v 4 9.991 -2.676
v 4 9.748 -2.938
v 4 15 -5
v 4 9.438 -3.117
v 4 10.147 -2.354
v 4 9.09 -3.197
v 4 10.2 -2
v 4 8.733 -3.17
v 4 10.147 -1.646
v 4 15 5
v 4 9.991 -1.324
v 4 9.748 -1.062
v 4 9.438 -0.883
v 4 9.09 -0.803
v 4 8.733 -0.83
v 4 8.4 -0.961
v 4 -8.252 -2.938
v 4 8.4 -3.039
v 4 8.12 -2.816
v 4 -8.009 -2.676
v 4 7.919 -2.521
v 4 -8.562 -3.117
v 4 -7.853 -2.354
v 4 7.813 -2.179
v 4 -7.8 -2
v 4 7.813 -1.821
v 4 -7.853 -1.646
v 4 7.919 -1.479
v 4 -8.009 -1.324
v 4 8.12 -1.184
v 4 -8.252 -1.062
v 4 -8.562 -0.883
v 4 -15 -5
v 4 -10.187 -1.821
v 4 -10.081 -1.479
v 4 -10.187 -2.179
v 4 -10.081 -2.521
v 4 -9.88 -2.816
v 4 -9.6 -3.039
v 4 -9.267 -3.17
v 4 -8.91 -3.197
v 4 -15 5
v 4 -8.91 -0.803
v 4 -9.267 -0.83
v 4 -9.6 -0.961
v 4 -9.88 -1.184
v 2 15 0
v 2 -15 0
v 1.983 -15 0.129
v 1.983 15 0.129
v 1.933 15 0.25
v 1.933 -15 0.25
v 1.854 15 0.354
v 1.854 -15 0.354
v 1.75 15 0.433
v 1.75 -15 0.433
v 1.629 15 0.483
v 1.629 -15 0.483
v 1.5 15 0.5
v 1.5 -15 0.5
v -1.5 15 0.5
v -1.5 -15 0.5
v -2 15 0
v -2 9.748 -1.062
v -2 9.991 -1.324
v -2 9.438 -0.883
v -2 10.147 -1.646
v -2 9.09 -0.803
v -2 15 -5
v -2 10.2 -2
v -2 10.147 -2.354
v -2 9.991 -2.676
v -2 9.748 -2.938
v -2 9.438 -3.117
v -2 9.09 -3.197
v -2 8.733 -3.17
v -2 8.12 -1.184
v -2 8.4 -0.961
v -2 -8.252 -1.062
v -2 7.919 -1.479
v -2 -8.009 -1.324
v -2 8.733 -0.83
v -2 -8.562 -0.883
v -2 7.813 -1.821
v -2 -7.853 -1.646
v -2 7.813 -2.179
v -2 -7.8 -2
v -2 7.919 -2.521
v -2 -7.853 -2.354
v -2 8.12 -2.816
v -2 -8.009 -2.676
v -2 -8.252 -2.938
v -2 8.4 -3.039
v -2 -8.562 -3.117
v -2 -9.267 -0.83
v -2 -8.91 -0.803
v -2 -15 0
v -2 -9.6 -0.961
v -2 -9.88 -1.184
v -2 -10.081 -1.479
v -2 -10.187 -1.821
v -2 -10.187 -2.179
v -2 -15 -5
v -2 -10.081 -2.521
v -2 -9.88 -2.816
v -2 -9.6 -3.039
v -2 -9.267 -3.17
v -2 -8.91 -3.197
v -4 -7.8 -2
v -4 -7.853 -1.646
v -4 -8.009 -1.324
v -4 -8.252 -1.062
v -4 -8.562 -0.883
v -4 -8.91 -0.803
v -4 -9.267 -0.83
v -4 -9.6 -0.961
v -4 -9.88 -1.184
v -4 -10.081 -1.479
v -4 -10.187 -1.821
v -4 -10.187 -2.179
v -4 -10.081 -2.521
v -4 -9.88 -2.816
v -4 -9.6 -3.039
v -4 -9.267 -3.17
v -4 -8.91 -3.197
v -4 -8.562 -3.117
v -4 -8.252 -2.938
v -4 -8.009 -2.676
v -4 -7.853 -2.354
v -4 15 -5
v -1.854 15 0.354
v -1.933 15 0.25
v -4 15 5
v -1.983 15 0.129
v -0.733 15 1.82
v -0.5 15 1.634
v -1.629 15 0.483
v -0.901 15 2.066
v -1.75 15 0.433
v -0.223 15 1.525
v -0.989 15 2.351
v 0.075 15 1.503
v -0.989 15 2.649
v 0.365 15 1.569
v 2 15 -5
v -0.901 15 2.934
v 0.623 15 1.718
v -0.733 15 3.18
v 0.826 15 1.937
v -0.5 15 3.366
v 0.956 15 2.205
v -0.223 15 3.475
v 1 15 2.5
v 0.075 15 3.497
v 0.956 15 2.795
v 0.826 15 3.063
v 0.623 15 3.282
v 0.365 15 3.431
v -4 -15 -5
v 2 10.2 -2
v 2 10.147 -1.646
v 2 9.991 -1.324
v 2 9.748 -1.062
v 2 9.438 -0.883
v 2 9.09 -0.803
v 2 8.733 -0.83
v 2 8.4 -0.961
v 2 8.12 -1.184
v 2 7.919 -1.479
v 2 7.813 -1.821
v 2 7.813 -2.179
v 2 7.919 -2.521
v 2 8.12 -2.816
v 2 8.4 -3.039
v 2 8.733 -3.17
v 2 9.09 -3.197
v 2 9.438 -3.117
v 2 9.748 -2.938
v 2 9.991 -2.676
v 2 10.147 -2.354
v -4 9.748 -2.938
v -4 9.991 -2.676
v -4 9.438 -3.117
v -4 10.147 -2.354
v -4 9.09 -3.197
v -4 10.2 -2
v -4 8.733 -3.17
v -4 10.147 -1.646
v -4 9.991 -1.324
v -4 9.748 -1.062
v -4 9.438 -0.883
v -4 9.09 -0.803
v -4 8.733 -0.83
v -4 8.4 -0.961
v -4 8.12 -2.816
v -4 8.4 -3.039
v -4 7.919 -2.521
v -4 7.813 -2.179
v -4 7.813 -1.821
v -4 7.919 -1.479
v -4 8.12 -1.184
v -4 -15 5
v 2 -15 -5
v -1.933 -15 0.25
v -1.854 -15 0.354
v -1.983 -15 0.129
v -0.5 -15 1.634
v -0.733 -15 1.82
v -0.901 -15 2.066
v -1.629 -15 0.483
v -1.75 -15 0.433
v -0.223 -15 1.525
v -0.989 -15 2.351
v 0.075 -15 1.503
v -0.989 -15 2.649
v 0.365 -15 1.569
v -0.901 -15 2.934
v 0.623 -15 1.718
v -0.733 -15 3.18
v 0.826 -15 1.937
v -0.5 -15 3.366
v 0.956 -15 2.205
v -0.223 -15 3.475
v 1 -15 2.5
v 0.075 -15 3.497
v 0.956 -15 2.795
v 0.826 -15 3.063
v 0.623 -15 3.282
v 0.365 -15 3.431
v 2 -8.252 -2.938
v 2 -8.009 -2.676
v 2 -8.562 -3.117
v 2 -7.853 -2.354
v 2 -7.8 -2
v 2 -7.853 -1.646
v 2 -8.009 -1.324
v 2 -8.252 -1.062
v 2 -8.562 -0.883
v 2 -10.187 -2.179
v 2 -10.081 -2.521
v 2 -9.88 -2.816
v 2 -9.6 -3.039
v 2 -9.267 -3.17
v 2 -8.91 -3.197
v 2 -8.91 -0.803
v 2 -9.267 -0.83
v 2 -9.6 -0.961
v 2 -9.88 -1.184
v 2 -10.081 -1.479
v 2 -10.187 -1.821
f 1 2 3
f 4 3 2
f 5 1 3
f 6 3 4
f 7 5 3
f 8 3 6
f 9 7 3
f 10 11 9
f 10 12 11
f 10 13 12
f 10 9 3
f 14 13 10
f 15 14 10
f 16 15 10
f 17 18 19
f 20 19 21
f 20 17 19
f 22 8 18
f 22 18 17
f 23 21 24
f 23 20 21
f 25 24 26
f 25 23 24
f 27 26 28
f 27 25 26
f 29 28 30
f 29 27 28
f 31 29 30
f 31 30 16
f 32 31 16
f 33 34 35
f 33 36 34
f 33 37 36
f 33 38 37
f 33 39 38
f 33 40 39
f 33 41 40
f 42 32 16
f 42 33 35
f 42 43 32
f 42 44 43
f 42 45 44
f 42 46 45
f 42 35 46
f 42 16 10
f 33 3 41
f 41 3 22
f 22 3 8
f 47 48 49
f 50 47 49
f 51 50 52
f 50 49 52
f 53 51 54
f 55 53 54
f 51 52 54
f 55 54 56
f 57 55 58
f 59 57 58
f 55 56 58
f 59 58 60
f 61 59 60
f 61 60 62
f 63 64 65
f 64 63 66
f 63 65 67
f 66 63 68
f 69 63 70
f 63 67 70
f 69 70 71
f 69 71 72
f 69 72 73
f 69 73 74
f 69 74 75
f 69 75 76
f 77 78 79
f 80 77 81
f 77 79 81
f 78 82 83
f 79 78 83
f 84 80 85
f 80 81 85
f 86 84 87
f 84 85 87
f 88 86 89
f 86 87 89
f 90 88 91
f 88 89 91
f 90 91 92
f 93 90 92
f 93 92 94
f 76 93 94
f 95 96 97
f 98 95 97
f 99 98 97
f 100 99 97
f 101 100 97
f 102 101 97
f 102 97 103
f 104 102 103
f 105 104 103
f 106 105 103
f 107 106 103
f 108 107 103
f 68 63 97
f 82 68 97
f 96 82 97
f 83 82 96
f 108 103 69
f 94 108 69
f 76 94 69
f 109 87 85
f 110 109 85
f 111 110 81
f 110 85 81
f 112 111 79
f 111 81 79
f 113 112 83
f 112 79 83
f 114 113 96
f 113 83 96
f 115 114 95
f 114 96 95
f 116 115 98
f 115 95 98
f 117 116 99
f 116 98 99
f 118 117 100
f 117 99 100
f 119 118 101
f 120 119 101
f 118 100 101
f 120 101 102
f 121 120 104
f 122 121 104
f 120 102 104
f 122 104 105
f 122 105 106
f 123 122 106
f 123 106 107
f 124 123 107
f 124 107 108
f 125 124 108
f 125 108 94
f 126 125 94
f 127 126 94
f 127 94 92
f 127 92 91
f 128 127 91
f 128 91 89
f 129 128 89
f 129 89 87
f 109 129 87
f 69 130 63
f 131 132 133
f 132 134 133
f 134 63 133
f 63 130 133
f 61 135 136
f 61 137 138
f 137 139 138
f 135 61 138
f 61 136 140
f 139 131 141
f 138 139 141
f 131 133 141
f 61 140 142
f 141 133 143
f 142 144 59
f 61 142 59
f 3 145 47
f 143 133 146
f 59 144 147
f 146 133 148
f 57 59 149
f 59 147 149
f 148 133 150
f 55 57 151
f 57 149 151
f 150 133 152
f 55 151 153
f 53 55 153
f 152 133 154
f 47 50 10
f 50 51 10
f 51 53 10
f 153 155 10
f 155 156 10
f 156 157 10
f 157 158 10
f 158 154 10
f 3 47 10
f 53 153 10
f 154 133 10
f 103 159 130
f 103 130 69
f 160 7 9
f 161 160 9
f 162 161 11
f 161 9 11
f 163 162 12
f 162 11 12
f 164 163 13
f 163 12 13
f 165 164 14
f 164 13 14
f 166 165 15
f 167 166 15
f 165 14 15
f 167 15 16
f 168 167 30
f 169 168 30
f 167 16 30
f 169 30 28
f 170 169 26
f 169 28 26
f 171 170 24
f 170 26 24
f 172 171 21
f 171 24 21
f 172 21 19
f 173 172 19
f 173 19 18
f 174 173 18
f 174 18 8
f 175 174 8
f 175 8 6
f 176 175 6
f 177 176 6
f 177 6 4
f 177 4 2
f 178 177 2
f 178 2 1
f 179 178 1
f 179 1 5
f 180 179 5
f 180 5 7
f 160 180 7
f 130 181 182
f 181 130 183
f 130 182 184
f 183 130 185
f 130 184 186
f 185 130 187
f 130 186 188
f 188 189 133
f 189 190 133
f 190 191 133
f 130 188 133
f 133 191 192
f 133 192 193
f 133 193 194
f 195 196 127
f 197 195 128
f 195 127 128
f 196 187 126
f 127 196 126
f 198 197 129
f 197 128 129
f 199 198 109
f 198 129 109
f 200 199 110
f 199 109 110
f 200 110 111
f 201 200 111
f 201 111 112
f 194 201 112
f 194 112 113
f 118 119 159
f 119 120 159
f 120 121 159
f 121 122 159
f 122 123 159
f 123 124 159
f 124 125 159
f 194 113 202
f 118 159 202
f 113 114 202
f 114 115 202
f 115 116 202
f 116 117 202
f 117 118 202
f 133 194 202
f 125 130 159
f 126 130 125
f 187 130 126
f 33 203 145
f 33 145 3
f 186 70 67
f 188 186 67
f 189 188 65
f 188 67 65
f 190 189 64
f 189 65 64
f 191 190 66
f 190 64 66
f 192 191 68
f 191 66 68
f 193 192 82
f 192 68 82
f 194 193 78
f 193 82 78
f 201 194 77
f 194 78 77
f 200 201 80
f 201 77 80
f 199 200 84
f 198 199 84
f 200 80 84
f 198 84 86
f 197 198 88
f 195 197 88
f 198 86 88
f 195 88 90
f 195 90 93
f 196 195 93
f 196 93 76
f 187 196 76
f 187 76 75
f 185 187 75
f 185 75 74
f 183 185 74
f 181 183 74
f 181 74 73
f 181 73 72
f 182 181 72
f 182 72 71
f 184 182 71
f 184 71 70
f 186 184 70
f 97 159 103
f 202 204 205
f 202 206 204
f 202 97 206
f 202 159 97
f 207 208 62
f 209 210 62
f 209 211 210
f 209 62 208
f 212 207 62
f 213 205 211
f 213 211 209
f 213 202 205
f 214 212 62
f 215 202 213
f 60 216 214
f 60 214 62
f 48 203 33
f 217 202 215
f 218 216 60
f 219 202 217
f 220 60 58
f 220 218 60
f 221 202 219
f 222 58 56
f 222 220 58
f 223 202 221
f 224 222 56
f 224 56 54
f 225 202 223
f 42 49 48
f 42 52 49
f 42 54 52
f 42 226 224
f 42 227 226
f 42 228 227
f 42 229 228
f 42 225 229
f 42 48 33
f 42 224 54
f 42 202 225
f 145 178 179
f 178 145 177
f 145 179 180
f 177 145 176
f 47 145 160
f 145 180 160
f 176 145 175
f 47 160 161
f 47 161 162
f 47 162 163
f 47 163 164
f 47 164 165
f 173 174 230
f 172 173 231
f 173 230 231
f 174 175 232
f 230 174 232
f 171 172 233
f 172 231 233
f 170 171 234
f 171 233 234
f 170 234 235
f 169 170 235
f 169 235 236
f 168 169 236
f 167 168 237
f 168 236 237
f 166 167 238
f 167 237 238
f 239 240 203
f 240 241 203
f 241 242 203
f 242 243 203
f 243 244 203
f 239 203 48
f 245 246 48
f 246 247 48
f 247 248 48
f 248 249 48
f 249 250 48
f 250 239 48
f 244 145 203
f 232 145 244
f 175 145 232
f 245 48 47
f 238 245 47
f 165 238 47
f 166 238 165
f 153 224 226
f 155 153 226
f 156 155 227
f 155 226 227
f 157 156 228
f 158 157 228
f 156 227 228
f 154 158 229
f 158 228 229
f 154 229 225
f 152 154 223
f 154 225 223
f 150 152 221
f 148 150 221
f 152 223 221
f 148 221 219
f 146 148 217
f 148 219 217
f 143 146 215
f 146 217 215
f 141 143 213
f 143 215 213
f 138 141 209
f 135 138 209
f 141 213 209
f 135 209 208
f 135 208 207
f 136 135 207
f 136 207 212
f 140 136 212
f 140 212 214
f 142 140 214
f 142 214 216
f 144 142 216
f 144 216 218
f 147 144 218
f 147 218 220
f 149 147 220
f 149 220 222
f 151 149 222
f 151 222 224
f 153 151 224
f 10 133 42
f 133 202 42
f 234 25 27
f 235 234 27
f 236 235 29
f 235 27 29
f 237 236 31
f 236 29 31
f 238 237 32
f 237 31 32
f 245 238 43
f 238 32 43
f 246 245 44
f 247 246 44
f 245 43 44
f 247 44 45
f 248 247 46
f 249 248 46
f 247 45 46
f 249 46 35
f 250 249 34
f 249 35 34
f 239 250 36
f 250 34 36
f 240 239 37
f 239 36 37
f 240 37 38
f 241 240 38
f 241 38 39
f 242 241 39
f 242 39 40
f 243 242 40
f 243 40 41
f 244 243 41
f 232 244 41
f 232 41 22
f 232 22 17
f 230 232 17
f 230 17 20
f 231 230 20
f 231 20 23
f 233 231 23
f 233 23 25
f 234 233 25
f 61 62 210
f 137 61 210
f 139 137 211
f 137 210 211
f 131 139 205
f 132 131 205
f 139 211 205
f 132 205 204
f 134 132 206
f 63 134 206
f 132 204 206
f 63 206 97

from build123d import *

# Parameters (mm, degrees)
F0_W          = 8
F0_H          = 10
F1_DEPTH      = 15
F1_DEPTH_BACK = 15
F2_R          = 1
F3_DEPTH      = 30.001
F5_DEPTH      = 30.001
F6_R          = 1.2
F7_DEPTH      = 8.001


with BuildPart() as f1:
    # F0 (on Front) → F1 (new body, two sides)
    with BuildSketch(Plane.XZ) as f1_sk:
        Rectangle(F0_W, F0_H)
    extrude(amount=F1_DEPTH)
    extrude(f1_sk.sketch, amount=-F1_DEPTH_BACK)

    # F2 (on face) → F3 (cut, through all)
    with BuildSketch(Plane.XZ.offset(15)):
        with Locations((0, 2.5)):
            Circle(F2_R)
    extrude(amount=-F3_DEPTH, mode=Mode.SUBTRACT)

    # F4 (on face) → F5 (cut, through all)
    with BuildSketch(Plane.XZ.offset(15)):
        with BuildLine():
            Line((-2, 0), (-2, -5))
            Line((-2, -5), (2, -5))
            Line((2, -5), (2, 0))
            ThreePointArc((2, 0), (1.853553, 0.353553), (1.5, 0.5))
            Line((1.5, 0.5), (-1.5, 0.5))
            ThreePointArc((-1.5, 0.5), (-1.853553, 0.353553), (-2, 0))
        make_face()
    extrude(amount=-F5_DEPTH, mode=Mode.SUBTRACT)

    # F6 (on face) → F7 (cut, through all)
    with BuildSketch(Plane.YZ.offset(4)):
        with Locations((-9, -2)):
            Circle(F6_R)
        with Locations((9, -2)):
            Circle(F6_R)
    extrude(amount=-F7_DEPTH, mode=Mode.SUBTRACT)


solid = f1.part
